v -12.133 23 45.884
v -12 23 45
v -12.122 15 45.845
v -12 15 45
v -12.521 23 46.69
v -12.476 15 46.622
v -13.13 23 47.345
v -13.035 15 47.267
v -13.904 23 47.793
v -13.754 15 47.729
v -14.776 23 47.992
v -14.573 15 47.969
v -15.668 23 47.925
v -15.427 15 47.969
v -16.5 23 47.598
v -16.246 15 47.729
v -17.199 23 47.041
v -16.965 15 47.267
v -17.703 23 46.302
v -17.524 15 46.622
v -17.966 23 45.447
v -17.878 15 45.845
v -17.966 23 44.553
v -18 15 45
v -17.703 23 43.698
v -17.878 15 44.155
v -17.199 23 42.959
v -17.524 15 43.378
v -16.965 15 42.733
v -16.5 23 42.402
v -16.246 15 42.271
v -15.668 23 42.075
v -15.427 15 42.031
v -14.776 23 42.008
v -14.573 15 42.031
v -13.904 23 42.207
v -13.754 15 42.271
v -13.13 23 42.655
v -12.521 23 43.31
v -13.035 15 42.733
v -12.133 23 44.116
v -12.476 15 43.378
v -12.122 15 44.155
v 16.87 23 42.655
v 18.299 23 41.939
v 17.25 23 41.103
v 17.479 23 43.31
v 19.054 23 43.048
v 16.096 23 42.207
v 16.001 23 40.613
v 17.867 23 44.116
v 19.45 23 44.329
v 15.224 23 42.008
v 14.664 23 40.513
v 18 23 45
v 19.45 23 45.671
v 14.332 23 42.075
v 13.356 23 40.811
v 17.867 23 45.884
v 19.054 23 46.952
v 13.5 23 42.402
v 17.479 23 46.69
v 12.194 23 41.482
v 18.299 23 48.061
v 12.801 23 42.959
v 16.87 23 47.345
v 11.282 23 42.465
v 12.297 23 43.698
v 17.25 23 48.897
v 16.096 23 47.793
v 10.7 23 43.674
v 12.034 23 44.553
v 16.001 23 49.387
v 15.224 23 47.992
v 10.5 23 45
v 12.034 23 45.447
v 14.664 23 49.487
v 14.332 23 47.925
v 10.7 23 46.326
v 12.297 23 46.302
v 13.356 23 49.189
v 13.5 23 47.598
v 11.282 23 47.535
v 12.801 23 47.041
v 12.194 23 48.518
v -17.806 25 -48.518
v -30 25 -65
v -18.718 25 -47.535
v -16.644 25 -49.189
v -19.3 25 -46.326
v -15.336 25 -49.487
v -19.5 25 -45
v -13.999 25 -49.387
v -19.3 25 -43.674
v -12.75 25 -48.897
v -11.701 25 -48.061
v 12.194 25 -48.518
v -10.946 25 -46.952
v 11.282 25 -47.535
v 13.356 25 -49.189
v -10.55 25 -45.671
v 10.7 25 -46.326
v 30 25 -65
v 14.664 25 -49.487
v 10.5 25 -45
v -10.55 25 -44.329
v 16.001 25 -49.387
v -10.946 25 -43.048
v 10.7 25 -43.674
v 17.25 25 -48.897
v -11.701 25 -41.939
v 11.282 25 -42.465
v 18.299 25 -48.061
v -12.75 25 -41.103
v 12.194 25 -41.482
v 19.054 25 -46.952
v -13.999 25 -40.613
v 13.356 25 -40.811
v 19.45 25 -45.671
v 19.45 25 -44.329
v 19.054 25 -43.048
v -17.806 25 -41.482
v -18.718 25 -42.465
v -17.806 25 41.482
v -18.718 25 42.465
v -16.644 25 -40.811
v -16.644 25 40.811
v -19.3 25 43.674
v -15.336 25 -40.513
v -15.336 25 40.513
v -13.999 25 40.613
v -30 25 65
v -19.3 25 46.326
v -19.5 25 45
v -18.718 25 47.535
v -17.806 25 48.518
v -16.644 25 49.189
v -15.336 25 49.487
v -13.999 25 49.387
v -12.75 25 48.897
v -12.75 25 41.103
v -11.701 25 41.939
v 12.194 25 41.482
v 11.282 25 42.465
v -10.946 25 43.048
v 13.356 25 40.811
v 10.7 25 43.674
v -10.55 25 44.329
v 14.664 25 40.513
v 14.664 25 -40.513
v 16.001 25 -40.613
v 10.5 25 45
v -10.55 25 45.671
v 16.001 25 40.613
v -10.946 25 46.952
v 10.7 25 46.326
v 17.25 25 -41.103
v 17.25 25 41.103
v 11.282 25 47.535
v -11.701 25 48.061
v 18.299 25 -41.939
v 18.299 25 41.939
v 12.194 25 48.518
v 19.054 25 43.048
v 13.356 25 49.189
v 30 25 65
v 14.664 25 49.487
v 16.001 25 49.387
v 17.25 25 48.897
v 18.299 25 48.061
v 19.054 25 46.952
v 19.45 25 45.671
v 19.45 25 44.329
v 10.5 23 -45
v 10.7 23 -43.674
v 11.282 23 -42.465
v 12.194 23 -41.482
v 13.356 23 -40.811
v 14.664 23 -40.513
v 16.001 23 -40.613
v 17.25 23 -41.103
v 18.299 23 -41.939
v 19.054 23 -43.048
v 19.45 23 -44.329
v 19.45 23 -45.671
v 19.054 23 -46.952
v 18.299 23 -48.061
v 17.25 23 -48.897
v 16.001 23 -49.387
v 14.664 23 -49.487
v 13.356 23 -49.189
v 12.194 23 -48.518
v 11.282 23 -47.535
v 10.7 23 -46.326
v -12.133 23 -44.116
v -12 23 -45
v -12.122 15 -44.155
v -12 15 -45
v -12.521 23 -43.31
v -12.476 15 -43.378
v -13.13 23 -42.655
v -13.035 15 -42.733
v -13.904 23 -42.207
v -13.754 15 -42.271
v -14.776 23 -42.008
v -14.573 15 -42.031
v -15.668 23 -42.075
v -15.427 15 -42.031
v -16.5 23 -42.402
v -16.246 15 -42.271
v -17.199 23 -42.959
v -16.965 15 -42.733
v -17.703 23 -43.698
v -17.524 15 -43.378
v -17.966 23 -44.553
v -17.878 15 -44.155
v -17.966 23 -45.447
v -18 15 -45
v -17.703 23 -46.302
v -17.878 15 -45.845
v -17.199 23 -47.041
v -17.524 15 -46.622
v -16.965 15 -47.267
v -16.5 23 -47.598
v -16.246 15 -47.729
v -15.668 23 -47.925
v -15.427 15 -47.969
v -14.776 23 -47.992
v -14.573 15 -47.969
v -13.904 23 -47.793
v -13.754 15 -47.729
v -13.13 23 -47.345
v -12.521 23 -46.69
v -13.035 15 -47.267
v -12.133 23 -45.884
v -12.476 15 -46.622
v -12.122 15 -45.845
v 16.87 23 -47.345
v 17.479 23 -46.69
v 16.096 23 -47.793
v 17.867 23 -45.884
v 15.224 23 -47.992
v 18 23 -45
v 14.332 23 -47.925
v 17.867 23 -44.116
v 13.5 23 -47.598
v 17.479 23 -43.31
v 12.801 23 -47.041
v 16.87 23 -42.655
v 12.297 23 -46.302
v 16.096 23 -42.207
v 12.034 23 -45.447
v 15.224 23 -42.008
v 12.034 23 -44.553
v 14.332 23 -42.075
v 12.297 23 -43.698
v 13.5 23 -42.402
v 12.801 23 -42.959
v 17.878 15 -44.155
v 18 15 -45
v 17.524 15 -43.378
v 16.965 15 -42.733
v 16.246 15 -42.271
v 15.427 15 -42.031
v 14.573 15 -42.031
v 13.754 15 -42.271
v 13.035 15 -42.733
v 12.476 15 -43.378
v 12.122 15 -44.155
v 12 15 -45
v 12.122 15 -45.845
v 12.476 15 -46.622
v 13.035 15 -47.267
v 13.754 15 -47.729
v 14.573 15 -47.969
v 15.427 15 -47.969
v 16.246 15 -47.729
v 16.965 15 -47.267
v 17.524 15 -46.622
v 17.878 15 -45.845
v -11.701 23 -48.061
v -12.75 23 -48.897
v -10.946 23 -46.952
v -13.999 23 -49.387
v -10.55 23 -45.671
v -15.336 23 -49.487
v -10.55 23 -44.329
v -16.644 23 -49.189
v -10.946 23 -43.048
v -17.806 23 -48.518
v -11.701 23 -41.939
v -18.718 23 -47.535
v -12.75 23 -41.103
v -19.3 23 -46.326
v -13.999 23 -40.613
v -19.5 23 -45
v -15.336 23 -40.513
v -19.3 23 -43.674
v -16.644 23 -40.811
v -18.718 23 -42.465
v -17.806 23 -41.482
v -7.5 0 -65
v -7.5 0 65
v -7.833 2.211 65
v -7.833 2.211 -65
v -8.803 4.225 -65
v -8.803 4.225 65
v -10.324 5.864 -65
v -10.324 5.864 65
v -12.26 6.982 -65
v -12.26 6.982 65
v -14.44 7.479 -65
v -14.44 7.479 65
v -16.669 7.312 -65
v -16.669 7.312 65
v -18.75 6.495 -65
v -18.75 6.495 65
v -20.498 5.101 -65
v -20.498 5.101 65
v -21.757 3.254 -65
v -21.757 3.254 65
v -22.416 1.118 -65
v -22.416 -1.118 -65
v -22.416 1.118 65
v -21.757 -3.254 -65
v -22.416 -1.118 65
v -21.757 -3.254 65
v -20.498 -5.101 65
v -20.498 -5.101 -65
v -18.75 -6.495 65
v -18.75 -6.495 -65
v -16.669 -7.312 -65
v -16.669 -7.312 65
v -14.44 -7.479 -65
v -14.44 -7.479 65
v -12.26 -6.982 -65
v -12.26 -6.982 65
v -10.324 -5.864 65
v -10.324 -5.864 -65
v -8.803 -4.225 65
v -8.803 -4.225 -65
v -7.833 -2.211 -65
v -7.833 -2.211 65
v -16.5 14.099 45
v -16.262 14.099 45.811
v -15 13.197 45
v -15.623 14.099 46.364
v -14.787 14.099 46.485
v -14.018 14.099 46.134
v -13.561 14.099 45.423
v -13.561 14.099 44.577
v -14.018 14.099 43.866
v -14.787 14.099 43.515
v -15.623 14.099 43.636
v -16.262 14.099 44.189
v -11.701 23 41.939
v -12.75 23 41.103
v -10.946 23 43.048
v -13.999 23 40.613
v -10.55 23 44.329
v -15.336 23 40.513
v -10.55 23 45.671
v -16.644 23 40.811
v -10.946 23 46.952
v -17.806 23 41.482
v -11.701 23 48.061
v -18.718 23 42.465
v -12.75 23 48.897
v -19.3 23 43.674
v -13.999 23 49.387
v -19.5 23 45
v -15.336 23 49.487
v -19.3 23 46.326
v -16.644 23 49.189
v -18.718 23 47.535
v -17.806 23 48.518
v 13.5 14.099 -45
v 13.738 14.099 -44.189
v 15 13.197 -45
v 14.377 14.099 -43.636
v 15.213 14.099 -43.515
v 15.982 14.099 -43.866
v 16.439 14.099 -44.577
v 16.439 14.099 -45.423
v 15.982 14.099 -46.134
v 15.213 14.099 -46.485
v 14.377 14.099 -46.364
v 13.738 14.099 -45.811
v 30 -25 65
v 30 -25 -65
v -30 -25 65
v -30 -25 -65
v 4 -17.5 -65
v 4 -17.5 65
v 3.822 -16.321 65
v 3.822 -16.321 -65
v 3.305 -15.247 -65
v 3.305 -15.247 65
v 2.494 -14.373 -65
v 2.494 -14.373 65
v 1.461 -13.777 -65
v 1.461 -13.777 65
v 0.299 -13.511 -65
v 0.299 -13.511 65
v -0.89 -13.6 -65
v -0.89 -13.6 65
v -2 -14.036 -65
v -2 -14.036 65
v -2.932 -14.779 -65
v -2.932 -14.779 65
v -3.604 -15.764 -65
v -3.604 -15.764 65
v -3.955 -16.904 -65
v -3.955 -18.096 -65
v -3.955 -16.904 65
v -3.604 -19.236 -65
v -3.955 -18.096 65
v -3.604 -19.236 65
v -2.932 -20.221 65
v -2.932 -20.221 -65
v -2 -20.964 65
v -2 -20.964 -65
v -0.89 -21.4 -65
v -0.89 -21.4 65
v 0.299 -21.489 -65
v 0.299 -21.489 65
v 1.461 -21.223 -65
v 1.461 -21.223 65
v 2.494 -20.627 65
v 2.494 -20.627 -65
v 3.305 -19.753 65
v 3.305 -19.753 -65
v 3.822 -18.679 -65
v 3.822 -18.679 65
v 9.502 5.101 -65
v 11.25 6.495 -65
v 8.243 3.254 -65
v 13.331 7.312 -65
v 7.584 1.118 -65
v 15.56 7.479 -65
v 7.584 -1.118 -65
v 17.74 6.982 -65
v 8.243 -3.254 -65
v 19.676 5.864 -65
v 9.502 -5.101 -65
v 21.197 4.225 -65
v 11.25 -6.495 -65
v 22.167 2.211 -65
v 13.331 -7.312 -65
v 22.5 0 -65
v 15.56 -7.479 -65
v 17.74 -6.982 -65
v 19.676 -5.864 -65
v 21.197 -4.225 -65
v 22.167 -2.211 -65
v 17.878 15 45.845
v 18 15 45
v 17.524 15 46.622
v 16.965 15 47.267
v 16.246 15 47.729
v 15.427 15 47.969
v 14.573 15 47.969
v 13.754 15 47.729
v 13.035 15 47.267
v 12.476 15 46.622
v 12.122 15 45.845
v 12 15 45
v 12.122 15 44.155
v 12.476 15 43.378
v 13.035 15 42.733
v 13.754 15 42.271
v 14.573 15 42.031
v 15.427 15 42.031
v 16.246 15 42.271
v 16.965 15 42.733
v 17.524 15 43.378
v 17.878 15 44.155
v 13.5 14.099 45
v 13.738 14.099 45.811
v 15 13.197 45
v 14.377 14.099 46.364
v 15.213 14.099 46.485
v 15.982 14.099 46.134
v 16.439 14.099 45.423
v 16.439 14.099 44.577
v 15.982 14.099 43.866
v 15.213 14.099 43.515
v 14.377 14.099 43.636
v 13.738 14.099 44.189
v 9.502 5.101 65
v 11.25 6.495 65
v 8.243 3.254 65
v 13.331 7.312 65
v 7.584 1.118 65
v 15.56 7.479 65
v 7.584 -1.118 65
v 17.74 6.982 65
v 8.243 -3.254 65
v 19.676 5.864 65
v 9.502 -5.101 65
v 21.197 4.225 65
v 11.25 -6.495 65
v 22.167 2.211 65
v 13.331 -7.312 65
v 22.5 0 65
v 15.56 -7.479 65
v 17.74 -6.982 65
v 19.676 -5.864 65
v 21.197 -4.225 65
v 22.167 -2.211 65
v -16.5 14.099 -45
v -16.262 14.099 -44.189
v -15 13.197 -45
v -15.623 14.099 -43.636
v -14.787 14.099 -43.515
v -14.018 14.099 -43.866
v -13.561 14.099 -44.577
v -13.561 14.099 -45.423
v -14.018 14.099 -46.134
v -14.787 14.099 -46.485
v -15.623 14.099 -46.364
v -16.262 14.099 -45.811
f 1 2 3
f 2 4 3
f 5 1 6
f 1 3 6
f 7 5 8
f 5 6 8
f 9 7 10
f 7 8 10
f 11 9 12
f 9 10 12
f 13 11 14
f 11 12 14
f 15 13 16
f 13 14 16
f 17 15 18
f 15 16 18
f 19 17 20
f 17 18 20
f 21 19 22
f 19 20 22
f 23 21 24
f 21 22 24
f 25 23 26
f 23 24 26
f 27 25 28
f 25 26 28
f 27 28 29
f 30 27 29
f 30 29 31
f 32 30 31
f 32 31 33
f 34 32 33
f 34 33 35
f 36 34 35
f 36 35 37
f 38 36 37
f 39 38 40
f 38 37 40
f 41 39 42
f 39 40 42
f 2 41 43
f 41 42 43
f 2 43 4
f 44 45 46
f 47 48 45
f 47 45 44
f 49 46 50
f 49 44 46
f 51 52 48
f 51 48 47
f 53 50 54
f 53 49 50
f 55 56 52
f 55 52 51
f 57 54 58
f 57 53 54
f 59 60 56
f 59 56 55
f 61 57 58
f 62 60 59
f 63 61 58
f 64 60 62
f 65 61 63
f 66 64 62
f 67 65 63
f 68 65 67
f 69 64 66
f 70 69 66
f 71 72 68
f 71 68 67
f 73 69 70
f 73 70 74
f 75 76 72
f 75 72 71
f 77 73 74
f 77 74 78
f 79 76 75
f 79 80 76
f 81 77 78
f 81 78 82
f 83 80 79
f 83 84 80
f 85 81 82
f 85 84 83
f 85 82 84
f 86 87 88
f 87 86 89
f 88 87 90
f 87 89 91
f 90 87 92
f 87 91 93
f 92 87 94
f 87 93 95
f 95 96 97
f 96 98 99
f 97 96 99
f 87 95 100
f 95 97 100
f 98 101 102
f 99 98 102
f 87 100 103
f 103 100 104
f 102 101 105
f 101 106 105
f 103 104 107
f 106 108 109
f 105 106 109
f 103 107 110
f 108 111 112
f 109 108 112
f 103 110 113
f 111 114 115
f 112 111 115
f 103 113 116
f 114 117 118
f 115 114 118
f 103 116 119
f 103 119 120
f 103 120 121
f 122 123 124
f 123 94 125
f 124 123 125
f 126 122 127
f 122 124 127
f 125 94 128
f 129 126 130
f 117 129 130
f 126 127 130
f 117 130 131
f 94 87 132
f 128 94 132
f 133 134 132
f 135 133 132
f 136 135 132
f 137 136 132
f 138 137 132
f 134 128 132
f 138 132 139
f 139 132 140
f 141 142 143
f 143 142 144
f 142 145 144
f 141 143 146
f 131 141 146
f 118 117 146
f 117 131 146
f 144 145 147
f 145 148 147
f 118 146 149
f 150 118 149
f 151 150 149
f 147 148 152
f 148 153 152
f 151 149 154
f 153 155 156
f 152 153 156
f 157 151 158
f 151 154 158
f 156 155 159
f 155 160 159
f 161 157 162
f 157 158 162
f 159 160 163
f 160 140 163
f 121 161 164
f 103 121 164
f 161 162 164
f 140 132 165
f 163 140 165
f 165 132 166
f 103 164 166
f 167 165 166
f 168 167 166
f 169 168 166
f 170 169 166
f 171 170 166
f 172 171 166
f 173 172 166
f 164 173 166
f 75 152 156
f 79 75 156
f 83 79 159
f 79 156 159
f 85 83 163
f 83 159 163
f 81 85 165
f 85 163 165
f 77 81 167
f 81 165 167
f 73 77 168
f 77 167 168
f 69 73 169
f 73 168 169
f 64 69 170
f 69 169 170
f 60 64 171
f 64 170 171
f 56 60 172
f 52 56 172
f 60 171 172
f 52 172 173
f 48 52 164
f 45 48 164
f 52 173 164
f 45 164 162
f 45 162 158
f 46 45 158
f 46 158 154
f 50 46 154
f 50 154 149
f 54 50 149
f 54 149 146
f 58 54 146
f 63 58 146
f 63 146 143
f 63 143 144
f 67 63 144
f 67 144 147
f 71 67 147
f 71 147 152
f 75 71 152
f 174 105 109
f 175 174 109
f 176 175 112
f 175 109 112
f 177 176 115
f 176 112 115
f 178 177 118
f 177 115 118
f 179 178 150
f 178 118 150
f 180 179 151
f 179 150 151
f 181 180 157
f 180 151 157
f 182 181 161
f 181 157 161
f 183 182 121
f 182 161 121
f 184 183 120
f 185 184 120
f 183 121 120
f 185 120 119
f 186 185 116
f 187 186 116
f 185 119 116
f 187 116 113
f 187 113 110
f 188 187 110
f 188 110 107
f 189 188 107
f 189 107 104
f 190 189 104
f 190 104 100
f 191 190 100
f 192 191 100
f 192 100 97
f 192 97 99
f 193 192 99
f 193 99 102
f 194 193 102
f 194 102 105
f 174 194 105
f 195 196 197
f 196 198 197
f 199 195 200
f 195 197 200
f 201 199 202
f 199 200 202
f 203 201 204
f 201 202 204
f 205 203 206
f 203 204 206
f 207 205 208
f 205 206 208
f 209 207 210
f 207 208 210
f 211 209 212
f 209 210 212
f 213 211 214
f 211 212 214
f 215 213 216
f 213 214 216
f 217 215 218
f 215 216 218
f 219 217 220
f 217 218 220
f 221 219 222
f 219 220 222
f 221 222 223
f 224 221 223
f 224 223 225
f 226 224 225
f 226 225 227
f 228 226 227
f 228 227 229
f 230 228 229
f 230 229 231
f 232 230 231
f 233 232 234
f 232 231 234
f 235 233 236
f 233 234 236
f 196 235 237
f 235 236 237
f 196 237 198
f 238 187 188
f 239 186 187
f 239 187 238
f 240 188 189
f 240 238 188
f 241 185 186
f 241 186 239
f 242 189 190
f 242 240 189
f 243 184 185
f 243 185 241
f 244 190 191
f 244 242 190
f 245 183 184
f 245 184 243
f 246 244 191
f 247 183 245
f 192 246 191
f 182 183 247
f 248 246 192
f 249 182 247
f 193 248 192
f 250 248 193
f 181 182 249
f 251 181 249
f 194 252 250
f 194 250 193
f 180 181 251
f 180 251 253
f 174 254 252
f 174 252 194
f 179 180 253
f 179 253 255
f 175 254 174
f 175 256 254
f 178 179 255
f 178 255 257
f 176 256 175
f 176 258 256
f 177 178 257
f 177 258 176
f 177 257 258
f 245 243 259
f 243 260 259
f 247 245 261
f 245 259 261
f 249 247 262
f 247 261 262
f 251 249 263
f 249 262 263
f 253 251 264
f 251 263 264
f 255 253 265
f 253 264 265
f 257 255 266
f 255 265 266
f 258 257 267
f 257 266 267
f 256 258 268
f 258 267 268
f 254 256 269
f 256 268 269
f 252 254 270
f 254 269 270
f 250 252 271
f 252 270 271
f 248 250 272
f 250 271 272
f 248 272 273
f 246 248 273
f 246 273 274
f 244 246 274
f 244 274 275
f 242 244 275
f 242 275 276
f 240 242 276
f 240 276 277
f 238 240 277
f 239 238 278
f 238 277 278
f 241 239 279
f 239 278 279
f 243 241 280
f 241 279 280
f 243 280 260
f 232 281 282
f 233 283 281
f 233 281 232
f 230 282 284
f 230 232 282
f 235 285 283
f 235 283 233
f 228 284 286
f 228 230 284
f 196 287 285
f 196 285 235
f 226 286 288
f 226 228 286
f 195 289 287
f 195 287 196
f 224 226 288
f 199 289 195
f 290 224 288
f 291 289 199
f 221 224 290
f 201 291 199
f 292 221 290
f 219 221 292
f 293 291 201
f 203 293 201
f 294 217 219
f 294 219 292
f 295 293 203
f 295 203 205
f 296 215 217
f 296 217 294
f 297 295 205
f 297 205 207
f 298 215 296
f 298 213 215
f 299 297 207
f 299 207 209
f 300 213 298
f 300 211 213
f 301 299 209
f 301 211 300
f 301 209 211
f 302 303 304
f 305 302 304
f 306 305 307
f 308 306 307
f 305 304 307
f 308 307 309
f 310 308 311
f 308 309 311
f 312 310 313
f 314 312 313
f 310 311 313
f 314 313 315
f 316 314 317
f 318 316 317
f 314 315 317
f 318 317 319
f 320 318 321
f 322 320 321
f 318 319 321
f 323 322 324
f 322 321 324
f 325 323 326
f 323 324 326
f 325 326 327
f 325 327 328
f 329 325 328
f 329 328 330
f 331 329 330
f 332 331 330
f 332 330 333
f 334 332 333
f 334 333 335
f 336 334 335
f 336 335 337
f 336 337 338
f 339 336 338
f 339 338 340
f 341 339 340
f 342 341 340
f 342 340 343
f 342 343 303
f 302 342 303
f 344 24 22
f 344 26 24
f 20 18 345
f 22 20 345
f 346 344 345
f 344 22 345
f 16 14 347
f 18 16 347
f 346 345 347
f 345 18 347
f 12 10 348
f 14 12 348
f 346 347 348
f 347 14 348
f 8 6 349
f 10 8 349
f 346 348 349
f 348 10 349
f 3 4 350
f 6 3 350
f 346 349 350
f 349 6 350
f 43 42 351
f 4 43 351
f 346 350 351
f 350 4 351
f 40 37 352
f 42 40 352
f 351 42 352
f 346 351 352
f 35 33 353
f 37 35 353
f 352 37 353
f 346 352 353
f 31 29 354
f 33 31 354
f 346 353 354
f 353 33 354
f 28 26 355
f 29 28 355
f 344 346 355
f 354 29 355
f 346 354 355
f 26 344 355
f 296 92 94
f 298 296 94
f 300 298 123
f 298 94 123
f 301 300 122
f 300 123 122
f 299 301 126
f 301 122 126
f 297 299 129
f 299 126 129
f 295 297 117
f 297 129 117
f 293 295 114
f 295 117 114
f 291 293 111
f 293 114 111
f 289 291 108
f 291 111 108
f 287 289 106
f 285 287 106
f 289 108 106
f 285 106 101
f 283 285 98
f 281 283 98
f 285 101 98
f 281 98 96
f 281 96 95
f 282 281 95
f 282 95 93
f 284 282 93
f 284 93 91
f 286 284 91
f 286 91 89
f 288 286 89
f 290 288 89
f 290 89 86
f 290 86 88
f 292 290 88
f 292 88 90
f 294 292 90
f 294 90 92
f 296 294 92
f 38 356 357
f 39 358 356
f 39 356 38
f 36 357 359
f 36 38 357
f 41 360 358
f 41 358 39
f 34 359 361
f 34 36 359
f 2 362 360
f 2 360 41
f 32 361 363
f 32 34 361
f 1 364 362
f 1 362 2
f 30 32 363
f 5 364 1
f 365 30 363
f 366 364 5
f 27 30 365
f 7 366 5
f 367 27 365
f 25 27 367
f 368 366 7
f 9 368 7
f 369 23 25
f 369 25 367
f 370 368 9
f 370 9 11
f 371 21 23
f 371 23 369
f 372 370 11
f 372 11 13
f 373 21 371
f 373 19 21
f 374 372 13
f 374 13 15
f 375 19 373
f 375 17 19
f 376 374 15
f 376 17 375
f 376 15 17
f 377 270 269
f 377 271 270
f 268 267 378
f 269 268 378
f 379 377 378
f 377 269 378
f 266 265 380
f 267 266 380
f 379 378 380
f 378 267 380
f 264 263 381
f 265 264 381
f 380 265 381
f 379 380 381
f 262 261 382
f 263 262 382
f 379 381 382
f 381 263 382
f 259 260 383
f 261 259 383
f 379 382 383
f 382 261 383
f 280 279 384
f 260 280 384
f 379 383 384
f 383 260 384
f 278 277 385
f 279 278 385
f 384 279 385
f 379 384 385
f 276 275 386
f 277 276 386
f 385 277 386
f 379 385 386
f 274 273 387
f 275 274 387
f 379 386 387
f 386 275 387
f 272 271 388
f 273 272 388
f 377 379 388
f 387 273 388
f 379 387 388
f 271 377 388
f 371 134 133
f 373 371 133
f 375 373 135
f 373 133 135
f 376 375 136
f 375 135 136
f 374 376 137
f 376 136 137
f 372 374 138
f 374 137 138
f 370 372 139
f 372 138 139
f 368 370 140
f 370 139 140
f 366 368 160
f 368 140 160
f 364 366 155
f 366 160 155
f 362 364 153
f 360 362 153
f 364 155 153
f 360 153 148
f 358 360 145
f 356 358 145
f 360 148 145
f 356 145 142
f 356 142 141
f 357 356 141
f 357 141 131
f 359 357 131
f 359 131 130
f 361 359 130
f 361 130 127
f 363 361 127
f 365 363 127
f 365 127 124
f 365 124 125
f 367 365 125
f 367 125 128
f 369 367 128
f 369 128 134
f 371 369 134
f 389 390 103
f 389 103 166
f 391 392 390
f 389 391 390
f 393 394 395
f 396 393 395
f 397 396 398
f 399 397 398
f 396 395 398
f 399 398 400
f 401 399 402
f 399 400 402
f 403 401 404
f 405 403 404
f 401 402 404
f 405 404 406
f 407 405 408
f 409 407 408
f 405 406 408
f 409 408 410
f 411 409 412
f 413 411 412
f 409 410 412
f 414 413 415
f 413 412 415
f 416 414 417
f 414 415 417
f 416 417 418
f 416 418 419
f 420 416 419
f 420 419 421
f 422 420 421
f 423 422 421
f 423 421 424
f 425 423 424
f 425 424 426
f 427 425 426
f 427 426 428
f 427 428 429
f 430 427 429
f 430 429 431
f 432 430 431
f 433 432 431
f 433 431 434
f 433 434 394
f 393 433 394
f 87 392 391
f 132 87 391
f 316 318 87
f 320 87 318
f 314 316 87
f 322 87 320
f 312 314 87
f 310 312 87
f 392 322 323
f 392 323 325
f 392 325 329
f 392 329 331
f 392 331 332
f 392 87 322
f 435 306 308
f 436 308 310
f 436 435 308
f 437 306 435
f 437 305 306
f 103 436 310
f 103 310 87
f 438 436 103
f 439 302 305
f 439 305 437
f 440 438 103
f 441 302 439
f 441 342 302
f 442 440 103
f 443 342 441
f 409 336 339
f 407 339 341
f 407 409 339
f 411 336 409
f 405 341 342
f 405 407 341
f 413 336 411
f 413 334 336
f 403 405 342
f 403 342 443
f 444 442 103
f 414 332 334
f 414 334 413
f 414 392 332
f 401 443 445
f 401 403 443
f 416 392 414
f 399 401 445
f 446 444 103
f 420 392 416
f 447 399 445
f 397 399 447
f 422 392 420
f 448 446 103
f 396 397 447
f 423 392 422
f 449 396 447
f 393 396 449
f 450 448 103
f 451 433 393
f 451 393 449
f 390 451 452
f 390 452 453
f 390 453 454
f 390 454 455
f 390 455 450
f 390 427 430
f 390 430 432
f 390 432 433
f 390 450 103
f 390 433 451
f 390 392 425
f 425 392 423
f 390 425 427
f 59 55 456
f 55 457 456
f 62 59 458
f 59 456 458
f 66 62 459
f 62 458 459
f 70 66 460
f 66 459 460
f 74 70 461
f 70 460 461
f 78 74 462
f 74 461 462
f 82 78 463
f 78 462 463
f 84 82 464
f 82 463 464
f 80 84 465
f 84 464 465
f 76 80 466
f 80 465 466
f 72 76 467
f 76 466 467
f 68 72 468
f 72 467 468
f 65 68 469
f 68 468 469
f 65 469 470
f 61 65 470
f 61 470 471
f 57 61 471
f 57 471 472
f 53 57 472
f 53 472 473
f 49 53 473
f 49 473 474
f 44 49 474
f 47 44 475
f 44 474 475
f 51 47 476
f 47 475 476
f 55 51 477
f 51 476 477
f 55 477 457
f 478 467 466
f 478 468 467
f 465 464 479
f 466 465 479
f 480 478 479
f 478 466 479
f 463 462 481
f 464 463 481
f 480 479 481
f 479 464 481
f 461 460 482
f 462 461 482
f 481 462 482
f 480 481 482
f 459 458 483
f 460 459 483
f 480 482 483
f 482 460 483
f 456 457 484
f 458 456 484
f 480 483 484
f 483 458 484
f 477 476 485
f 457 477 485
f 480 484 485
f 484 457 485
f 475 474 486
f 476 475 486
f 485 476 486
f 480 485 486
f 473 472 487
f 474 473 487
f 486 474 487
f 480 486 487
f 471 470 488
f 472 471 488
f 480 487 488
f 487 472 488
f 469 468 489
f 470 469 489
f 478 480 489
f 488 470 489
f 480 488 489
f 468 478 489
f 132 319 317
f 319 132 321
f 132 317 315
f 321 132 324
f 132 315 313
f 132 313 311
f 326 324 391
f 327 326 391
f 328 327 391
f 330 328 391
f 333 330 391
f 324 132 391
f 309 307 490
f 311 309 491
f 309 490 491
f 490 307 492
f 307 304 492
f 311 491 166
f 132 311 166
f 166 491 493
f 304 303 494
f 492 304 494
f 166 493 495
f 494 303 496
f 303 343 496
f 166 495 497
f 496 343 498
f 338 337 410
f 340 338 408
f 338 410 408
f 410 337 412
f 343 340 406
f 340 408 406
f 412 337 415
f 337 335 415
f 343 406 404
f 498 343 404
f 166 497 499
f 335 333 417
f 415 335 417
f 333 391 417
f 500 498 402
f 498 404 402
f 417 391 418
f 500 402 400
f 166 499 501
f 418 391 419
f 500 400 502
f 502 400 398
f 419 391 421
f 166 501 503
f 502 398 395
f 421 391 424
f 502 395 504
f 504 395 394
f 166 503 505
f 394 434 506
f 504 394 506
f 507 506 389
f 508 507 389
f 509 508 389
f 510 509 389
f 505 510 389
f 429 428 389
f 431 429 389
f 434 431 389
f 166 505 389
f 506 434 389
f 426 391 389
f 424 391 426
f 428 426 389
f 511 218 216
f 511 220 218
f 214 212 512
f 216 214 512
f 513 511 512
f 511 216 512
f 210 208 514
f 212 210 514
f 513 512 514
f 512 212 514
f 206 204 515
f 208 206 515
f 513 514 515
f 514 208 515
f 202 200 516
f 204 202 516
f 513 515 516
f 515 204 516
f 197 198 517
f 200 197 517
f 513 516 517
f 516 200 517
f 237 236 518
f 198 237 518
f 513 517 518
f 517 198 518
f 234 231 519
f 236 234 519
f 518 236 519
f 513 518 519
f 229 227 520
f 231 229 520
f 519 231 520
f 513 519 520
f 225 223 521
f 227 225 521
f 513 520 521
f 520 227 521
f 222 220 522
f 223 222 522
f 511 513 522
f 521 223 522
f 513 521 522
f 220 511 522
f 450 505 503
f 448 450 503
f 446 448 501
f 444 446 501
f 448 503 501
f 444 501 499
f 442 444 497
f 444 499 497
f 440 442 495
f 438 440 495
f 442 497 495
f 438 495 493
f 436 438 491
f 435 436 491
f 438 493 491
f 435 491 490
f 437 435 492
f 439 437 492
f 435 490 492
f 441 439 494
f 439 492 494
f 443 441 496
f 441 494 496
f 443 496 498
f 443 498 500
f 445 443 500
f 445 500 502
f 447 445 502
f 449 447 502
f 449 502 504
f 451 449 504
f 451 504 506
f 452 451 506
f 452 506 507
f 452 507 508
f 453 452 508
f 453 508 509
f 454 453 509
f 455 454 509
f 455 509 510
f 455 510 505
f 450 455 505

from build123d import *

# Parameters (mm, degrees)
F0_W           = 60
F0_H           = 130
F1_DEPTH       = 25
F2_R           = 7.5
F2_R_2         = 4
F3_DEPTH       = 130.001
F5_D           = 6
F5_DEPTH       = 10
F5_CBORE_D     = 9
F5_CBORE_DEPTH = 2
F5_TIP         = 1.8025818571


with BuildPart() as f1:
    # F0 (on Front) → F1 (new body, symmetric)
    with BuildSketch(Plane.XZ):
        Rectangle(F0_W, F0_H)
    extrude(amount=F1_DEPTH, both=True)

    # F2 (on face) → F3 (cut, through all)
    with BuildSketch(Plane.XY.offset(65)):
        with Locations((-15, 0)):
            Circle(F2_R)
        with Locations((15, 0)):
            Circle(F2_R)
        with Locations((0, -17.5)):
            Circle(F2_R_2)
    extrude(amount=-F3_DEPTH, mode=Mode.SUBTRACT)

    # F5
    with Locations(Plane(origin=(0, 25, 0), x_dir=(-1, 0, 0), z_dir=(0, 1, 0))):
        with Locations((-15, 45), (15, 45), (15, -45), (-15, -45)):
            CounterBoreHole(F5_D / 2, F5_CBORE_D / 2, F5_CBORE_DEPTH, depth=F5_DEPTH)
            with Locations((0, 0, -(F5_DEPTH + F5_TIP / 2))):  # 118° drill point
                Cone(0, F5_D / 2, F5_TIP, mode=Mode.SUBTRACT)


solid = f1.part
